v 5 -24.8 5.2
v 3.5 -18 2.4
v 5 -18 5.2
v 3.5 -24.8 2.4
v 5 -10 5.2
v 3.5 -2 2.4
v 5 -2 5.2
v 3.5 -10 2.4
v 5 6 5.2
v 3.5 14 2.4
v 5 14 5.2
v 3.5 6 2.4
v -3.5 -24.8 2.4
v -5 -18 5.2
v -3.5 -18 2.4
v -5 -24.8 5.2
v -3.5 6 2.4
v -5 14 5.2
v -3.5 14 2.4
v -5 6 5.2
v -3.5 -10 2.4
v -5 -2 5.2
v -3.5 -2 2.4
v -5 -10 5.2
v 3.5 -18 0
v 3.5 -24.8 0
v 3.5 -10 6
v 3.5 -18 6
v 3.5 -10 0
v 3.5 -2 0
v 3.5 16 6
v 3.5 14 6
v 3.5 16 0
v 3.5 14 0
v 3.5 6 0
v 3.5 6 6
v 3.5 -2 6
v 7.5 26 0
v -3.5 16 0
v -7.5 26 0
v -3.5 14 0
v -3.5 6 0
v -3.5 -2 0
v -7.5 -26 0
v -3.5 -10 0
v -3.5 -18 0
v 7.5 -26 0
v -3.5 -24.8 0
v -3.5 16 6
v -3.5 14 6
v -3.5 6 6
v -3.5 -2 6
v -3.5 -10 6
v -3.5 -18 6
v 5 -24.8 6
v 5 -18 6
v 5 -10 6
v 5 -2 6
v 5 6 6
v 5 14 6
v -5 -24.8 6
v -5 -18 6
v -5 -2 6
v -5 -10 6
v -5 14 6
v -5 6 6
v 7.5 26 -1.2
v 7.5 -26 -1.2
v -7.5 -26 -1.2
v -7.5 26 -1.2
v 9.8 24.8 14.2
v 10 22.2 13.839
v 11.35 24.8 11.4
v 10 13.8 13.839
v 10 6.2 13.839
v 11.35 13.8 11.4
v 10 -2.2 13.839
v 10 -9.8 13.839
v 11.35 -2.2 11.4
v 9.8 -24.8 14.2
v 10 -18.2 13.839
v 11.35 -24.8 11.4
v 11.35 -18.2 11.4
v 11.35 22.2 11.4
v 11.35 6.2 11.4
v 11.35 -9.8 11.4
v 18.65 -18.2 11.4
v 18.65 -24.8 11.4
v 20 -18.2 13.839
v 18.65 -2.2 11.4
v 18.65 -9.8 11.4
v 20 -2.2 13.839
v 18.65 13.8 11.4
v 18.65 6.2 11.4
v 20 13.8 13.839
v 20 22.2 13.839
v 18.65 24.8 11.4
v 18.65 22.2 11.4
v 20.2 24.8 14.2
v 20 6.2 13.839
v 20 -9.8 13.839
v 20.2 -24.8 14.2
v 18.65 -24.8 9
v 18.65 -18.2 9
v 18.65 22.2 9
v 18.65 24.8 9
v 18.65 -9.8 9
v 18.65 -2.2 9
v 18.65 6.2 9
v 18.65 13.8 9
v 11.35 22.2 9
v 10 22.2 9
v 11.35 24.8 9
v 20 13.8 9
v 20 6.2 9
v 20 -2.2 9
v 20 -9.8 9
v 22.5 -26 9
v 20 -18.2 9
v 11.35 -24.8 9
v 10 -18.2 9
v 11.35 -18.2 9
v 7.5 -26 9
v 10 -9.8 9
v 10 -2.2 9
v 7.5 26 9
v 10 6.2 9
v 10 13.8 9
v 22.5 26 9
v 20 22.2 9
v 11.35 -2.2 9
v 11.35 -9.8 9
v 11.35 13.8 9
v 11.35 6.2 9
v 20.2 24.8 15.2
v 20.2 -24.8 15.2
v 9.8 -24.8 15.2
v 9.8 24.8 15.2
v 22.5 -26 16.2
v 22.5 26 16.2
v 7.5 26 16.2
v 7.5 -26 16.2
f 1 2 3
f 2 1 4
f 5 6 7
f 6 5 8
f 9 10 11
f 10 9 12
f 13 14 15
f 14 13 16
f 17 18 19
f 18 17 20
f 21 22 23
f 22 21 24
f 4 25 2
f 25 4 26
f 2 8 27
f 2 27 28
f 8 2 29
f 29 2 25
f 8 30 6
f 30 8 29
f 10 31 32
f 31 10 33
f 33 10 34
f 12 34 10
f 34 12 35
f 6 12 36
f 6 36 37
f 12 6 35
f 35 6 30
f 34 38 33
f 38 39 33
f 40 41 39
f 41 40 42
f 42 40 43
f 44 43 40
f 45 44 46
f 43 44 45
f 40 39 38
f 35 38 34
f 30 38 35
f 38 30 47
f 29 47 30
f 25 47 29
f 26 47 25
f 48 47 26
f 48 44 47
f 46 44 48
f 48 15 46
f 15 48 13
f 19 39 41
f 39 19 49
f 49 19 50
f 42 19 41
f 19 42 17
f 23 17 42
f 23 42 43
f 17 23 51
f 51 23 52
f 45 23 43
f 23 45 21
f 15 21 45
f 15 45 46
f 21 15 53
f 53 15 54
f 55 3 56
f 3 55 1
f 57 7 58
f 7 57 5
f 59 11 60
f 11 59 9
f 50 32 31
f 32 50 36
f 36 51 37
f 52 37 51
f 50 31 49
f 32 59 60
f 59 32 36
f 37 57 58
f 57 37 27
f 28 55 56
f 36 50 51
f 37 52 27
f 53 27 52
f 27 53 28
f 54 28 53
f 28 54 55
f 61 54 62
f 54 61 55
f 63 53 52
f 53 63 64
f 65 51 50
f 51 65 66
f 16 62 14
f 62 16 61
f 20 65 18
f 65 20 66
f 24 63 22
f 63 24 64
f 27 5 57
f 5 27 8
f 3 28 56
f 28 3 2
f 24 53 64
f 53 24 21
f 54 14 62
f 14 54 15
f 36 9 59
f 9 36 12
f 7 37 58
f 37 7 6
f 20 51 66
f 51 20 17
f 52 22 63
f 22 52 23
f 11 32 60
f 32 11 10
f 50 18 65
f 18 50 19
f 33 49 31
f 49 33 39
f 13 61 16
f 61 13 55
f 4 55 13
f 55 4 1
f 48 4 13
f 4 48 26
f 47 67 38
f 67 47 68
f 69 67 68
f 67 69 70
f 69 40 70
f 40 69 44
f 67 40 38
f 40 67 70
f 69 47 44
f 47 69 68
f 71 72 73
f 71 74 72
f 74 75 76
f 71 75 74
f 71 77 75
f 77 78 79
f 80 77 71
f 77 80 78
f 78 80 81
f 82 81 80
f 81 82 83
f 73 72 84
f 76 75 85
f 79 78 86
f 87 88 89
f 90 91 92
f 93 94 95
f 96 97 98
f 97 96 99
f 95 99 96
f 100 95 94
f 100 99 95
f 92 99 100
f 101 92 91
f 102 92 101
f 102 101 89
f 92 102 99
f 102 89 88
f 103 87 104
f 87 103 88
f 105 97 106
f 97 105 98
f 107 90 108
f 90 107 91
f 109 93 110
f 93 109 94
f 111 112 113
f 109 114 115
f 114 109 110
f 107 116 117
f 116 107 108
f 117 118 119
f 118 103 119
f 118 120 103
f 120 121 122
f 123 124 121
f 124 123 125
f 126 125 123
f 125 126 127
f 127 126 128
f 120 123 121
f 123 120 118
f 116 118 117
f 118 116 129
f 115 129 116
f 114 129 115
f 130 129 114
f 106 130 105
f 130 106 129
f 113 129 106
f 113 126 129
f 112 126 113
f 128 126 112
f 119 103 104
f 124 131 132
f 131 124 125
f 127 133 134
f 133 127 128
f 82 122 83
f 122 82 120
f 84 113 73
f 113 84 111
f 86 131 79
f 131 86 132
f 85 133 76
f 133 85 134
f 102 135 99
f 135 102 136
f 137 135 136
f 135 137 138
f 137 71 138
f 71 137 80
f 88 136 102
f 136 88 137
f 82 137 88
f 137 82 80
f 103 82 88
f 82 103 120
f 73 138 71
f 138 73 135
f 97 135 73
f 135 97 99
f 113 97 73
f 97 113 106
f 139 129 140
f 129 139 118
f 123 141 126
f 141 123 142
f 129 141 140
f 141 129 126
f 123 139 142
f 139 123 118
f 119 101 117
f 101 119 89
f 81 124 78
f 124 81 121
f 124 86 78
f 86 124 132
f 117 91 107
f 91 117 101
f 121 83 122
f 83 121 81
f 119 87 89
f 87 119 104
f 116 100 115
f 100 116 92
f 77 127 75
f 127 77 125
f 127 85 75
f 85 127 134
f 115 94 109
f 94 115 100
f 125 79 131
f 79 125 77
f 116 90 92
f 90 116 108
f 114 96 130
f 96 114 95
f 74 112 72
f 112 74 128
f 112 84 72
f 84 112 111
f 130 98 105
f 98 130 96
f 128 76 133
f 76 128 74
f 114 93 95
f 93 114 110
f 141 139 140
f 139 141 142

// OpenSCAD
Height=6;
Length=52;
Hole_Count=2;
//Drop_Test=20;  // [10:S, 20:M, 30:L]

module connector_tooth(
    baserail=1, snapper=false, spaceronly=false,
    wtop=10,  // limit, because bridge length is limited
    wbottom=7,
    toothlen=8,
    h=4,
    l=20,
    holecount=0, holewidth=5, 
    basethickness=1.2,basewidth=15)
{
   olap=(wtop-wbottom)*1.2;
   toothcount=floor(l/(2*toothlen));
   echo("toothcount=",toothcount);

   if (baserail==1 || baserail==2){
      l1=(h/2*-1)+basethickness*2;
      l2=(h/2*-1)+basethickness*4+0.4; // ensure to get more then 45 dec
      if (!spaceronly){
         difference(){
            translate([0,0,h/2]) union(){
               difference(){
                  union(){
                     hull(){
                        translate([0,l/2,l1]) 
                           cylinder(r1=wbottom/2,h=l2-l1,r2=wtop/2,$fn=60);
                        translate([0,l/2*-1,l1]) 
                           cylinder(r1=wbottom/2,h=l2-l1,r2=wtop/2,$fn=60);
                     };
                     translate([wbottom/2*-1,l/2*-1,h/2*-1]) 
                        cube([wbottom,l,h/2-l1]);
                     translate([wtop/2*-1,(l/2+wtop/2)*-1,l2]) 
                        cube([wtop,l+wtop,(h/2)-l2]);
//                     translate([0,l/2,(h/2)*-1]) 
//                        cylinder(r=wbottom/2,h=h/2,$fn=60);
                  }
                  translate([(wtop/2)*-1,(l/2+wtop-basethickness)*-1,h/2*-1]) 
                     cube([wtop,wtop,h]);
                  translate([(wtop/2)*-1,(l/2-basethickness),h/2*-1]) 
                     cube([wtop,wtop,h]);
                  if (baserail==1){
                     for(i=[0:toothcount]){
                        translate([wbottom,
                                   (l/2*-1)-(toothlen/2)+(toothlen*2*i),
                                   0]) 
                           cube([wbottom,toothlen,h],center=true);
                        translate([wbottom*-1,
                                   (l/2*-1)-(toothlen/2)+(toothlen*2*i),
                                   0]) 
                           cube([wbottom,toothlen,h],center=true);
                     }
                     translate([0,l/2-(toothlen)/2,0]) 
                        cube([wtop,toothlen*1.5,h],center=true);
                  }
              //    translate([0,
              //               (l/2*-1)+(toothlen*2*toothcount),
              //               0]) 
              //       cube([wtop,toothlen+0.2,h/2],center=true);
               };
               // BaseBlade
               translate([(basewidth/2)*-1,(l/2)*-1,(h/2+basethickness)*-1]) 
                  cube([basewidth,l,basethickness]);
//               if (snapper){
//                  for(i=[1:1]){
//                     translate([0-(wbottom/2-0.2),(l/2)*-1+i*3,(h/2)*-1]) 
//                        cylinder(r=0.7,h=h/2,$fn=60);
//                     translate([wbottom/2-0.2,(l/2)*-1+i*3,(h/2)*-1]) 
//                        cylinder(r=0.7,h=h/2,$fn=60);
//                   }
//               }
            }
//            if (holecount>0){
//               translate([0,0.5*wbottom+((l/holecount)/2)-(l/2),
//                          (basethickness)*-1]) 
//               for(i=[0:holecount-1]){
//                  hhole=h/2+basethickness;
//                  hsink=holewidth/3;
//                  sinkwidth=holewidth*1.8;
//                  translate([0,i*(l/holecount),0]) 
//                     cylinder(r=holewidth/2,h=hhole,$fn=60);
//                  translate([0,i*(l/holecount),hhole]) 
//                     cylinder(r1=holewidth/2,
//                              r2=sinkwidth/2,
//                              h=hsink,$fn=60);
//                  translate([0,i*(l/holecount),hhole+hsink]) 
//                     cylinder(r=sinkwidth/2,
//                              h=h,$fn=60);
//               }
//            }
         }
      }
      else{
         translate([(basewidth/2)*-1,(l/2)*-1,0]) 
            cube([basewidth,l+basewidth/2,basethickness+h]);
      }
   }
   else{
      difference(){
         translate([(basewidth/2)*-1,(l/2)*-1,0]) 
            cube([basewidth,l,basethickness+h]);
         if (!spaceronly){
            connector_tooth(baserail=2,
                           wtop=wtop+0.4,
                           snapper=snapper,
                           wbottom=wbottom+0.3,
                           h=h+0.2,l=l,
                           holecount=holecount);
         }
         for(i=[1:toothcount]){
            translate([0,
                       (l/2*-1)-(toothlen/2)+(toothlen*2*i),
                       h/2]) 
               cube([wtop,toothlen+0.4,h],center=true);
         }




      }

   }
}

if (false) 
   color("red")  
   translate([0,0,Height*1.5*-1]) 
   connector_tooth(h=Height,baserail=true,spaceronly=true,l=Length,holecount=Hole_Count);

if (true) 
   color("blue")  
   connector_tooth(h=Height,baserail=1,snapper=true,l=Length,
                  holecount=Hole_Count);

if (true) 
   color("green") 
   translate([Height*2.5,0,Height*1.5]) 
   connector_tooth(h=Height,baserail=0,snapper=true,l=Length);

if (false)
   color("red") 
   translate([0,0,Height*3]) 
   connector_tooth(h=Height,baserail=false,spaceronly=true,l=Length);
